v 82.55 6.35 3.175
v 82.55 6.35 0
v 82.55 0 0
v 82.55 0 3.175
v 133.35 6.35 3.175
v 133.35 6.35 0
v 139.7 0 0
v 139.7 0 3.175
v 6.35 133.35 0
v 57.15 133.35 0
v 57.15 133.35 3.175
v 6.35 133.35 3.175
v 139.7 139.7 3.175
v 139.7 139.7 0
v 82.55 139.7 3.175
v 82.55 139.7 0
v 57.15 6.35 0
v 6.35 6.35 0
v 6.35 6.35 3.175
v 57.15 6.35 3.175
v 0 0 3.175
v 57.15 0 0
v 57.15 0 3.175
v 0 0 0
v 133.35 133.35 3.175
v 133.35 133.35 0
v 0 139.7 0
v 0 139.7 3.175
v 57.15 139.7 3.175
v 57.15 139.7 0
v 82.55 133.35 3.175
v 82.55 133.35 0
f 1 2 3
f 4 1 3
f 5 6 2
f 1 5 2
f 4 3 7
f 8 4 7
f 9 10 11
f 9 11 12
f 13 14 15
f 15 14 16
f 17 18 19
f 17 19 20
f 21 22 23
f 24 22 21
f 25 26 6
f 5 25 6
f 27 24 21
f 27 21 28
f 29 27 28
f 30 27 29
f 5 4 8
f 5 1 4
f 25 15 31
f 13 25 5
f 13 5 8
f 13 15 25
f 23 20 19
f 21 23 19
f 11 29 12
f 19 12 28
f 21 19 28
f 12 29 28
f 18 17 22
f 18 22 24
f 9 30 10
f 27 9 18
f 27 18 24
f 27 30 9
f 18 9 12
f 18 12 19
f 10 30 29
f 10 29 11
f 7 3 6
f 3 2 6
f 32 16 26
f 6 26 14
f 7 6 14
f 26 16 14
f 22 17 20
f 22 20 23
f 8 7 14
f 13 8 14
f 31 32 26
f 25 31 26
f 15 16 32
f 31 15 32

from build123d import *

# Parameters (mm, degrees)
BOSS_EXTRUDE1_DEPTH   = 3.175
BOSS_EXTRUDE1_2_DEPTH = 3.175


with BuildPart() as part:
    # Sketch1 → Boss-Extrude1 (new body)
    with BuildSketch(Plane.XY):
        Polygon((57.15, 6.35), (57.15, 0), (0, 0), (0, 139.7), (57.15, 139.7), (57.15, 133.35), (6.35, 133.35), (6.35, 6.35), align=None)
    extrude(amount=BOSS_EXTRUDE1_DEPTH)


with BuildPart() as body_2:
    # Sketch1 → Boss-Extrude1 2 (new body)
    with BuildSketch(Plane.XY):
        Polygon((82.55, 0), (139.7, 0), (139.7, 139.7), (82.55, 139.7), (82.55, 133.35), (133.35, 133.35), (133.35, 6.35), (82.55, 6.35), align=None)
    extrude(amount=BOSS_EXTRUDE1_2_DEPTH)


solid = Compound([part.part, body_2.part])
